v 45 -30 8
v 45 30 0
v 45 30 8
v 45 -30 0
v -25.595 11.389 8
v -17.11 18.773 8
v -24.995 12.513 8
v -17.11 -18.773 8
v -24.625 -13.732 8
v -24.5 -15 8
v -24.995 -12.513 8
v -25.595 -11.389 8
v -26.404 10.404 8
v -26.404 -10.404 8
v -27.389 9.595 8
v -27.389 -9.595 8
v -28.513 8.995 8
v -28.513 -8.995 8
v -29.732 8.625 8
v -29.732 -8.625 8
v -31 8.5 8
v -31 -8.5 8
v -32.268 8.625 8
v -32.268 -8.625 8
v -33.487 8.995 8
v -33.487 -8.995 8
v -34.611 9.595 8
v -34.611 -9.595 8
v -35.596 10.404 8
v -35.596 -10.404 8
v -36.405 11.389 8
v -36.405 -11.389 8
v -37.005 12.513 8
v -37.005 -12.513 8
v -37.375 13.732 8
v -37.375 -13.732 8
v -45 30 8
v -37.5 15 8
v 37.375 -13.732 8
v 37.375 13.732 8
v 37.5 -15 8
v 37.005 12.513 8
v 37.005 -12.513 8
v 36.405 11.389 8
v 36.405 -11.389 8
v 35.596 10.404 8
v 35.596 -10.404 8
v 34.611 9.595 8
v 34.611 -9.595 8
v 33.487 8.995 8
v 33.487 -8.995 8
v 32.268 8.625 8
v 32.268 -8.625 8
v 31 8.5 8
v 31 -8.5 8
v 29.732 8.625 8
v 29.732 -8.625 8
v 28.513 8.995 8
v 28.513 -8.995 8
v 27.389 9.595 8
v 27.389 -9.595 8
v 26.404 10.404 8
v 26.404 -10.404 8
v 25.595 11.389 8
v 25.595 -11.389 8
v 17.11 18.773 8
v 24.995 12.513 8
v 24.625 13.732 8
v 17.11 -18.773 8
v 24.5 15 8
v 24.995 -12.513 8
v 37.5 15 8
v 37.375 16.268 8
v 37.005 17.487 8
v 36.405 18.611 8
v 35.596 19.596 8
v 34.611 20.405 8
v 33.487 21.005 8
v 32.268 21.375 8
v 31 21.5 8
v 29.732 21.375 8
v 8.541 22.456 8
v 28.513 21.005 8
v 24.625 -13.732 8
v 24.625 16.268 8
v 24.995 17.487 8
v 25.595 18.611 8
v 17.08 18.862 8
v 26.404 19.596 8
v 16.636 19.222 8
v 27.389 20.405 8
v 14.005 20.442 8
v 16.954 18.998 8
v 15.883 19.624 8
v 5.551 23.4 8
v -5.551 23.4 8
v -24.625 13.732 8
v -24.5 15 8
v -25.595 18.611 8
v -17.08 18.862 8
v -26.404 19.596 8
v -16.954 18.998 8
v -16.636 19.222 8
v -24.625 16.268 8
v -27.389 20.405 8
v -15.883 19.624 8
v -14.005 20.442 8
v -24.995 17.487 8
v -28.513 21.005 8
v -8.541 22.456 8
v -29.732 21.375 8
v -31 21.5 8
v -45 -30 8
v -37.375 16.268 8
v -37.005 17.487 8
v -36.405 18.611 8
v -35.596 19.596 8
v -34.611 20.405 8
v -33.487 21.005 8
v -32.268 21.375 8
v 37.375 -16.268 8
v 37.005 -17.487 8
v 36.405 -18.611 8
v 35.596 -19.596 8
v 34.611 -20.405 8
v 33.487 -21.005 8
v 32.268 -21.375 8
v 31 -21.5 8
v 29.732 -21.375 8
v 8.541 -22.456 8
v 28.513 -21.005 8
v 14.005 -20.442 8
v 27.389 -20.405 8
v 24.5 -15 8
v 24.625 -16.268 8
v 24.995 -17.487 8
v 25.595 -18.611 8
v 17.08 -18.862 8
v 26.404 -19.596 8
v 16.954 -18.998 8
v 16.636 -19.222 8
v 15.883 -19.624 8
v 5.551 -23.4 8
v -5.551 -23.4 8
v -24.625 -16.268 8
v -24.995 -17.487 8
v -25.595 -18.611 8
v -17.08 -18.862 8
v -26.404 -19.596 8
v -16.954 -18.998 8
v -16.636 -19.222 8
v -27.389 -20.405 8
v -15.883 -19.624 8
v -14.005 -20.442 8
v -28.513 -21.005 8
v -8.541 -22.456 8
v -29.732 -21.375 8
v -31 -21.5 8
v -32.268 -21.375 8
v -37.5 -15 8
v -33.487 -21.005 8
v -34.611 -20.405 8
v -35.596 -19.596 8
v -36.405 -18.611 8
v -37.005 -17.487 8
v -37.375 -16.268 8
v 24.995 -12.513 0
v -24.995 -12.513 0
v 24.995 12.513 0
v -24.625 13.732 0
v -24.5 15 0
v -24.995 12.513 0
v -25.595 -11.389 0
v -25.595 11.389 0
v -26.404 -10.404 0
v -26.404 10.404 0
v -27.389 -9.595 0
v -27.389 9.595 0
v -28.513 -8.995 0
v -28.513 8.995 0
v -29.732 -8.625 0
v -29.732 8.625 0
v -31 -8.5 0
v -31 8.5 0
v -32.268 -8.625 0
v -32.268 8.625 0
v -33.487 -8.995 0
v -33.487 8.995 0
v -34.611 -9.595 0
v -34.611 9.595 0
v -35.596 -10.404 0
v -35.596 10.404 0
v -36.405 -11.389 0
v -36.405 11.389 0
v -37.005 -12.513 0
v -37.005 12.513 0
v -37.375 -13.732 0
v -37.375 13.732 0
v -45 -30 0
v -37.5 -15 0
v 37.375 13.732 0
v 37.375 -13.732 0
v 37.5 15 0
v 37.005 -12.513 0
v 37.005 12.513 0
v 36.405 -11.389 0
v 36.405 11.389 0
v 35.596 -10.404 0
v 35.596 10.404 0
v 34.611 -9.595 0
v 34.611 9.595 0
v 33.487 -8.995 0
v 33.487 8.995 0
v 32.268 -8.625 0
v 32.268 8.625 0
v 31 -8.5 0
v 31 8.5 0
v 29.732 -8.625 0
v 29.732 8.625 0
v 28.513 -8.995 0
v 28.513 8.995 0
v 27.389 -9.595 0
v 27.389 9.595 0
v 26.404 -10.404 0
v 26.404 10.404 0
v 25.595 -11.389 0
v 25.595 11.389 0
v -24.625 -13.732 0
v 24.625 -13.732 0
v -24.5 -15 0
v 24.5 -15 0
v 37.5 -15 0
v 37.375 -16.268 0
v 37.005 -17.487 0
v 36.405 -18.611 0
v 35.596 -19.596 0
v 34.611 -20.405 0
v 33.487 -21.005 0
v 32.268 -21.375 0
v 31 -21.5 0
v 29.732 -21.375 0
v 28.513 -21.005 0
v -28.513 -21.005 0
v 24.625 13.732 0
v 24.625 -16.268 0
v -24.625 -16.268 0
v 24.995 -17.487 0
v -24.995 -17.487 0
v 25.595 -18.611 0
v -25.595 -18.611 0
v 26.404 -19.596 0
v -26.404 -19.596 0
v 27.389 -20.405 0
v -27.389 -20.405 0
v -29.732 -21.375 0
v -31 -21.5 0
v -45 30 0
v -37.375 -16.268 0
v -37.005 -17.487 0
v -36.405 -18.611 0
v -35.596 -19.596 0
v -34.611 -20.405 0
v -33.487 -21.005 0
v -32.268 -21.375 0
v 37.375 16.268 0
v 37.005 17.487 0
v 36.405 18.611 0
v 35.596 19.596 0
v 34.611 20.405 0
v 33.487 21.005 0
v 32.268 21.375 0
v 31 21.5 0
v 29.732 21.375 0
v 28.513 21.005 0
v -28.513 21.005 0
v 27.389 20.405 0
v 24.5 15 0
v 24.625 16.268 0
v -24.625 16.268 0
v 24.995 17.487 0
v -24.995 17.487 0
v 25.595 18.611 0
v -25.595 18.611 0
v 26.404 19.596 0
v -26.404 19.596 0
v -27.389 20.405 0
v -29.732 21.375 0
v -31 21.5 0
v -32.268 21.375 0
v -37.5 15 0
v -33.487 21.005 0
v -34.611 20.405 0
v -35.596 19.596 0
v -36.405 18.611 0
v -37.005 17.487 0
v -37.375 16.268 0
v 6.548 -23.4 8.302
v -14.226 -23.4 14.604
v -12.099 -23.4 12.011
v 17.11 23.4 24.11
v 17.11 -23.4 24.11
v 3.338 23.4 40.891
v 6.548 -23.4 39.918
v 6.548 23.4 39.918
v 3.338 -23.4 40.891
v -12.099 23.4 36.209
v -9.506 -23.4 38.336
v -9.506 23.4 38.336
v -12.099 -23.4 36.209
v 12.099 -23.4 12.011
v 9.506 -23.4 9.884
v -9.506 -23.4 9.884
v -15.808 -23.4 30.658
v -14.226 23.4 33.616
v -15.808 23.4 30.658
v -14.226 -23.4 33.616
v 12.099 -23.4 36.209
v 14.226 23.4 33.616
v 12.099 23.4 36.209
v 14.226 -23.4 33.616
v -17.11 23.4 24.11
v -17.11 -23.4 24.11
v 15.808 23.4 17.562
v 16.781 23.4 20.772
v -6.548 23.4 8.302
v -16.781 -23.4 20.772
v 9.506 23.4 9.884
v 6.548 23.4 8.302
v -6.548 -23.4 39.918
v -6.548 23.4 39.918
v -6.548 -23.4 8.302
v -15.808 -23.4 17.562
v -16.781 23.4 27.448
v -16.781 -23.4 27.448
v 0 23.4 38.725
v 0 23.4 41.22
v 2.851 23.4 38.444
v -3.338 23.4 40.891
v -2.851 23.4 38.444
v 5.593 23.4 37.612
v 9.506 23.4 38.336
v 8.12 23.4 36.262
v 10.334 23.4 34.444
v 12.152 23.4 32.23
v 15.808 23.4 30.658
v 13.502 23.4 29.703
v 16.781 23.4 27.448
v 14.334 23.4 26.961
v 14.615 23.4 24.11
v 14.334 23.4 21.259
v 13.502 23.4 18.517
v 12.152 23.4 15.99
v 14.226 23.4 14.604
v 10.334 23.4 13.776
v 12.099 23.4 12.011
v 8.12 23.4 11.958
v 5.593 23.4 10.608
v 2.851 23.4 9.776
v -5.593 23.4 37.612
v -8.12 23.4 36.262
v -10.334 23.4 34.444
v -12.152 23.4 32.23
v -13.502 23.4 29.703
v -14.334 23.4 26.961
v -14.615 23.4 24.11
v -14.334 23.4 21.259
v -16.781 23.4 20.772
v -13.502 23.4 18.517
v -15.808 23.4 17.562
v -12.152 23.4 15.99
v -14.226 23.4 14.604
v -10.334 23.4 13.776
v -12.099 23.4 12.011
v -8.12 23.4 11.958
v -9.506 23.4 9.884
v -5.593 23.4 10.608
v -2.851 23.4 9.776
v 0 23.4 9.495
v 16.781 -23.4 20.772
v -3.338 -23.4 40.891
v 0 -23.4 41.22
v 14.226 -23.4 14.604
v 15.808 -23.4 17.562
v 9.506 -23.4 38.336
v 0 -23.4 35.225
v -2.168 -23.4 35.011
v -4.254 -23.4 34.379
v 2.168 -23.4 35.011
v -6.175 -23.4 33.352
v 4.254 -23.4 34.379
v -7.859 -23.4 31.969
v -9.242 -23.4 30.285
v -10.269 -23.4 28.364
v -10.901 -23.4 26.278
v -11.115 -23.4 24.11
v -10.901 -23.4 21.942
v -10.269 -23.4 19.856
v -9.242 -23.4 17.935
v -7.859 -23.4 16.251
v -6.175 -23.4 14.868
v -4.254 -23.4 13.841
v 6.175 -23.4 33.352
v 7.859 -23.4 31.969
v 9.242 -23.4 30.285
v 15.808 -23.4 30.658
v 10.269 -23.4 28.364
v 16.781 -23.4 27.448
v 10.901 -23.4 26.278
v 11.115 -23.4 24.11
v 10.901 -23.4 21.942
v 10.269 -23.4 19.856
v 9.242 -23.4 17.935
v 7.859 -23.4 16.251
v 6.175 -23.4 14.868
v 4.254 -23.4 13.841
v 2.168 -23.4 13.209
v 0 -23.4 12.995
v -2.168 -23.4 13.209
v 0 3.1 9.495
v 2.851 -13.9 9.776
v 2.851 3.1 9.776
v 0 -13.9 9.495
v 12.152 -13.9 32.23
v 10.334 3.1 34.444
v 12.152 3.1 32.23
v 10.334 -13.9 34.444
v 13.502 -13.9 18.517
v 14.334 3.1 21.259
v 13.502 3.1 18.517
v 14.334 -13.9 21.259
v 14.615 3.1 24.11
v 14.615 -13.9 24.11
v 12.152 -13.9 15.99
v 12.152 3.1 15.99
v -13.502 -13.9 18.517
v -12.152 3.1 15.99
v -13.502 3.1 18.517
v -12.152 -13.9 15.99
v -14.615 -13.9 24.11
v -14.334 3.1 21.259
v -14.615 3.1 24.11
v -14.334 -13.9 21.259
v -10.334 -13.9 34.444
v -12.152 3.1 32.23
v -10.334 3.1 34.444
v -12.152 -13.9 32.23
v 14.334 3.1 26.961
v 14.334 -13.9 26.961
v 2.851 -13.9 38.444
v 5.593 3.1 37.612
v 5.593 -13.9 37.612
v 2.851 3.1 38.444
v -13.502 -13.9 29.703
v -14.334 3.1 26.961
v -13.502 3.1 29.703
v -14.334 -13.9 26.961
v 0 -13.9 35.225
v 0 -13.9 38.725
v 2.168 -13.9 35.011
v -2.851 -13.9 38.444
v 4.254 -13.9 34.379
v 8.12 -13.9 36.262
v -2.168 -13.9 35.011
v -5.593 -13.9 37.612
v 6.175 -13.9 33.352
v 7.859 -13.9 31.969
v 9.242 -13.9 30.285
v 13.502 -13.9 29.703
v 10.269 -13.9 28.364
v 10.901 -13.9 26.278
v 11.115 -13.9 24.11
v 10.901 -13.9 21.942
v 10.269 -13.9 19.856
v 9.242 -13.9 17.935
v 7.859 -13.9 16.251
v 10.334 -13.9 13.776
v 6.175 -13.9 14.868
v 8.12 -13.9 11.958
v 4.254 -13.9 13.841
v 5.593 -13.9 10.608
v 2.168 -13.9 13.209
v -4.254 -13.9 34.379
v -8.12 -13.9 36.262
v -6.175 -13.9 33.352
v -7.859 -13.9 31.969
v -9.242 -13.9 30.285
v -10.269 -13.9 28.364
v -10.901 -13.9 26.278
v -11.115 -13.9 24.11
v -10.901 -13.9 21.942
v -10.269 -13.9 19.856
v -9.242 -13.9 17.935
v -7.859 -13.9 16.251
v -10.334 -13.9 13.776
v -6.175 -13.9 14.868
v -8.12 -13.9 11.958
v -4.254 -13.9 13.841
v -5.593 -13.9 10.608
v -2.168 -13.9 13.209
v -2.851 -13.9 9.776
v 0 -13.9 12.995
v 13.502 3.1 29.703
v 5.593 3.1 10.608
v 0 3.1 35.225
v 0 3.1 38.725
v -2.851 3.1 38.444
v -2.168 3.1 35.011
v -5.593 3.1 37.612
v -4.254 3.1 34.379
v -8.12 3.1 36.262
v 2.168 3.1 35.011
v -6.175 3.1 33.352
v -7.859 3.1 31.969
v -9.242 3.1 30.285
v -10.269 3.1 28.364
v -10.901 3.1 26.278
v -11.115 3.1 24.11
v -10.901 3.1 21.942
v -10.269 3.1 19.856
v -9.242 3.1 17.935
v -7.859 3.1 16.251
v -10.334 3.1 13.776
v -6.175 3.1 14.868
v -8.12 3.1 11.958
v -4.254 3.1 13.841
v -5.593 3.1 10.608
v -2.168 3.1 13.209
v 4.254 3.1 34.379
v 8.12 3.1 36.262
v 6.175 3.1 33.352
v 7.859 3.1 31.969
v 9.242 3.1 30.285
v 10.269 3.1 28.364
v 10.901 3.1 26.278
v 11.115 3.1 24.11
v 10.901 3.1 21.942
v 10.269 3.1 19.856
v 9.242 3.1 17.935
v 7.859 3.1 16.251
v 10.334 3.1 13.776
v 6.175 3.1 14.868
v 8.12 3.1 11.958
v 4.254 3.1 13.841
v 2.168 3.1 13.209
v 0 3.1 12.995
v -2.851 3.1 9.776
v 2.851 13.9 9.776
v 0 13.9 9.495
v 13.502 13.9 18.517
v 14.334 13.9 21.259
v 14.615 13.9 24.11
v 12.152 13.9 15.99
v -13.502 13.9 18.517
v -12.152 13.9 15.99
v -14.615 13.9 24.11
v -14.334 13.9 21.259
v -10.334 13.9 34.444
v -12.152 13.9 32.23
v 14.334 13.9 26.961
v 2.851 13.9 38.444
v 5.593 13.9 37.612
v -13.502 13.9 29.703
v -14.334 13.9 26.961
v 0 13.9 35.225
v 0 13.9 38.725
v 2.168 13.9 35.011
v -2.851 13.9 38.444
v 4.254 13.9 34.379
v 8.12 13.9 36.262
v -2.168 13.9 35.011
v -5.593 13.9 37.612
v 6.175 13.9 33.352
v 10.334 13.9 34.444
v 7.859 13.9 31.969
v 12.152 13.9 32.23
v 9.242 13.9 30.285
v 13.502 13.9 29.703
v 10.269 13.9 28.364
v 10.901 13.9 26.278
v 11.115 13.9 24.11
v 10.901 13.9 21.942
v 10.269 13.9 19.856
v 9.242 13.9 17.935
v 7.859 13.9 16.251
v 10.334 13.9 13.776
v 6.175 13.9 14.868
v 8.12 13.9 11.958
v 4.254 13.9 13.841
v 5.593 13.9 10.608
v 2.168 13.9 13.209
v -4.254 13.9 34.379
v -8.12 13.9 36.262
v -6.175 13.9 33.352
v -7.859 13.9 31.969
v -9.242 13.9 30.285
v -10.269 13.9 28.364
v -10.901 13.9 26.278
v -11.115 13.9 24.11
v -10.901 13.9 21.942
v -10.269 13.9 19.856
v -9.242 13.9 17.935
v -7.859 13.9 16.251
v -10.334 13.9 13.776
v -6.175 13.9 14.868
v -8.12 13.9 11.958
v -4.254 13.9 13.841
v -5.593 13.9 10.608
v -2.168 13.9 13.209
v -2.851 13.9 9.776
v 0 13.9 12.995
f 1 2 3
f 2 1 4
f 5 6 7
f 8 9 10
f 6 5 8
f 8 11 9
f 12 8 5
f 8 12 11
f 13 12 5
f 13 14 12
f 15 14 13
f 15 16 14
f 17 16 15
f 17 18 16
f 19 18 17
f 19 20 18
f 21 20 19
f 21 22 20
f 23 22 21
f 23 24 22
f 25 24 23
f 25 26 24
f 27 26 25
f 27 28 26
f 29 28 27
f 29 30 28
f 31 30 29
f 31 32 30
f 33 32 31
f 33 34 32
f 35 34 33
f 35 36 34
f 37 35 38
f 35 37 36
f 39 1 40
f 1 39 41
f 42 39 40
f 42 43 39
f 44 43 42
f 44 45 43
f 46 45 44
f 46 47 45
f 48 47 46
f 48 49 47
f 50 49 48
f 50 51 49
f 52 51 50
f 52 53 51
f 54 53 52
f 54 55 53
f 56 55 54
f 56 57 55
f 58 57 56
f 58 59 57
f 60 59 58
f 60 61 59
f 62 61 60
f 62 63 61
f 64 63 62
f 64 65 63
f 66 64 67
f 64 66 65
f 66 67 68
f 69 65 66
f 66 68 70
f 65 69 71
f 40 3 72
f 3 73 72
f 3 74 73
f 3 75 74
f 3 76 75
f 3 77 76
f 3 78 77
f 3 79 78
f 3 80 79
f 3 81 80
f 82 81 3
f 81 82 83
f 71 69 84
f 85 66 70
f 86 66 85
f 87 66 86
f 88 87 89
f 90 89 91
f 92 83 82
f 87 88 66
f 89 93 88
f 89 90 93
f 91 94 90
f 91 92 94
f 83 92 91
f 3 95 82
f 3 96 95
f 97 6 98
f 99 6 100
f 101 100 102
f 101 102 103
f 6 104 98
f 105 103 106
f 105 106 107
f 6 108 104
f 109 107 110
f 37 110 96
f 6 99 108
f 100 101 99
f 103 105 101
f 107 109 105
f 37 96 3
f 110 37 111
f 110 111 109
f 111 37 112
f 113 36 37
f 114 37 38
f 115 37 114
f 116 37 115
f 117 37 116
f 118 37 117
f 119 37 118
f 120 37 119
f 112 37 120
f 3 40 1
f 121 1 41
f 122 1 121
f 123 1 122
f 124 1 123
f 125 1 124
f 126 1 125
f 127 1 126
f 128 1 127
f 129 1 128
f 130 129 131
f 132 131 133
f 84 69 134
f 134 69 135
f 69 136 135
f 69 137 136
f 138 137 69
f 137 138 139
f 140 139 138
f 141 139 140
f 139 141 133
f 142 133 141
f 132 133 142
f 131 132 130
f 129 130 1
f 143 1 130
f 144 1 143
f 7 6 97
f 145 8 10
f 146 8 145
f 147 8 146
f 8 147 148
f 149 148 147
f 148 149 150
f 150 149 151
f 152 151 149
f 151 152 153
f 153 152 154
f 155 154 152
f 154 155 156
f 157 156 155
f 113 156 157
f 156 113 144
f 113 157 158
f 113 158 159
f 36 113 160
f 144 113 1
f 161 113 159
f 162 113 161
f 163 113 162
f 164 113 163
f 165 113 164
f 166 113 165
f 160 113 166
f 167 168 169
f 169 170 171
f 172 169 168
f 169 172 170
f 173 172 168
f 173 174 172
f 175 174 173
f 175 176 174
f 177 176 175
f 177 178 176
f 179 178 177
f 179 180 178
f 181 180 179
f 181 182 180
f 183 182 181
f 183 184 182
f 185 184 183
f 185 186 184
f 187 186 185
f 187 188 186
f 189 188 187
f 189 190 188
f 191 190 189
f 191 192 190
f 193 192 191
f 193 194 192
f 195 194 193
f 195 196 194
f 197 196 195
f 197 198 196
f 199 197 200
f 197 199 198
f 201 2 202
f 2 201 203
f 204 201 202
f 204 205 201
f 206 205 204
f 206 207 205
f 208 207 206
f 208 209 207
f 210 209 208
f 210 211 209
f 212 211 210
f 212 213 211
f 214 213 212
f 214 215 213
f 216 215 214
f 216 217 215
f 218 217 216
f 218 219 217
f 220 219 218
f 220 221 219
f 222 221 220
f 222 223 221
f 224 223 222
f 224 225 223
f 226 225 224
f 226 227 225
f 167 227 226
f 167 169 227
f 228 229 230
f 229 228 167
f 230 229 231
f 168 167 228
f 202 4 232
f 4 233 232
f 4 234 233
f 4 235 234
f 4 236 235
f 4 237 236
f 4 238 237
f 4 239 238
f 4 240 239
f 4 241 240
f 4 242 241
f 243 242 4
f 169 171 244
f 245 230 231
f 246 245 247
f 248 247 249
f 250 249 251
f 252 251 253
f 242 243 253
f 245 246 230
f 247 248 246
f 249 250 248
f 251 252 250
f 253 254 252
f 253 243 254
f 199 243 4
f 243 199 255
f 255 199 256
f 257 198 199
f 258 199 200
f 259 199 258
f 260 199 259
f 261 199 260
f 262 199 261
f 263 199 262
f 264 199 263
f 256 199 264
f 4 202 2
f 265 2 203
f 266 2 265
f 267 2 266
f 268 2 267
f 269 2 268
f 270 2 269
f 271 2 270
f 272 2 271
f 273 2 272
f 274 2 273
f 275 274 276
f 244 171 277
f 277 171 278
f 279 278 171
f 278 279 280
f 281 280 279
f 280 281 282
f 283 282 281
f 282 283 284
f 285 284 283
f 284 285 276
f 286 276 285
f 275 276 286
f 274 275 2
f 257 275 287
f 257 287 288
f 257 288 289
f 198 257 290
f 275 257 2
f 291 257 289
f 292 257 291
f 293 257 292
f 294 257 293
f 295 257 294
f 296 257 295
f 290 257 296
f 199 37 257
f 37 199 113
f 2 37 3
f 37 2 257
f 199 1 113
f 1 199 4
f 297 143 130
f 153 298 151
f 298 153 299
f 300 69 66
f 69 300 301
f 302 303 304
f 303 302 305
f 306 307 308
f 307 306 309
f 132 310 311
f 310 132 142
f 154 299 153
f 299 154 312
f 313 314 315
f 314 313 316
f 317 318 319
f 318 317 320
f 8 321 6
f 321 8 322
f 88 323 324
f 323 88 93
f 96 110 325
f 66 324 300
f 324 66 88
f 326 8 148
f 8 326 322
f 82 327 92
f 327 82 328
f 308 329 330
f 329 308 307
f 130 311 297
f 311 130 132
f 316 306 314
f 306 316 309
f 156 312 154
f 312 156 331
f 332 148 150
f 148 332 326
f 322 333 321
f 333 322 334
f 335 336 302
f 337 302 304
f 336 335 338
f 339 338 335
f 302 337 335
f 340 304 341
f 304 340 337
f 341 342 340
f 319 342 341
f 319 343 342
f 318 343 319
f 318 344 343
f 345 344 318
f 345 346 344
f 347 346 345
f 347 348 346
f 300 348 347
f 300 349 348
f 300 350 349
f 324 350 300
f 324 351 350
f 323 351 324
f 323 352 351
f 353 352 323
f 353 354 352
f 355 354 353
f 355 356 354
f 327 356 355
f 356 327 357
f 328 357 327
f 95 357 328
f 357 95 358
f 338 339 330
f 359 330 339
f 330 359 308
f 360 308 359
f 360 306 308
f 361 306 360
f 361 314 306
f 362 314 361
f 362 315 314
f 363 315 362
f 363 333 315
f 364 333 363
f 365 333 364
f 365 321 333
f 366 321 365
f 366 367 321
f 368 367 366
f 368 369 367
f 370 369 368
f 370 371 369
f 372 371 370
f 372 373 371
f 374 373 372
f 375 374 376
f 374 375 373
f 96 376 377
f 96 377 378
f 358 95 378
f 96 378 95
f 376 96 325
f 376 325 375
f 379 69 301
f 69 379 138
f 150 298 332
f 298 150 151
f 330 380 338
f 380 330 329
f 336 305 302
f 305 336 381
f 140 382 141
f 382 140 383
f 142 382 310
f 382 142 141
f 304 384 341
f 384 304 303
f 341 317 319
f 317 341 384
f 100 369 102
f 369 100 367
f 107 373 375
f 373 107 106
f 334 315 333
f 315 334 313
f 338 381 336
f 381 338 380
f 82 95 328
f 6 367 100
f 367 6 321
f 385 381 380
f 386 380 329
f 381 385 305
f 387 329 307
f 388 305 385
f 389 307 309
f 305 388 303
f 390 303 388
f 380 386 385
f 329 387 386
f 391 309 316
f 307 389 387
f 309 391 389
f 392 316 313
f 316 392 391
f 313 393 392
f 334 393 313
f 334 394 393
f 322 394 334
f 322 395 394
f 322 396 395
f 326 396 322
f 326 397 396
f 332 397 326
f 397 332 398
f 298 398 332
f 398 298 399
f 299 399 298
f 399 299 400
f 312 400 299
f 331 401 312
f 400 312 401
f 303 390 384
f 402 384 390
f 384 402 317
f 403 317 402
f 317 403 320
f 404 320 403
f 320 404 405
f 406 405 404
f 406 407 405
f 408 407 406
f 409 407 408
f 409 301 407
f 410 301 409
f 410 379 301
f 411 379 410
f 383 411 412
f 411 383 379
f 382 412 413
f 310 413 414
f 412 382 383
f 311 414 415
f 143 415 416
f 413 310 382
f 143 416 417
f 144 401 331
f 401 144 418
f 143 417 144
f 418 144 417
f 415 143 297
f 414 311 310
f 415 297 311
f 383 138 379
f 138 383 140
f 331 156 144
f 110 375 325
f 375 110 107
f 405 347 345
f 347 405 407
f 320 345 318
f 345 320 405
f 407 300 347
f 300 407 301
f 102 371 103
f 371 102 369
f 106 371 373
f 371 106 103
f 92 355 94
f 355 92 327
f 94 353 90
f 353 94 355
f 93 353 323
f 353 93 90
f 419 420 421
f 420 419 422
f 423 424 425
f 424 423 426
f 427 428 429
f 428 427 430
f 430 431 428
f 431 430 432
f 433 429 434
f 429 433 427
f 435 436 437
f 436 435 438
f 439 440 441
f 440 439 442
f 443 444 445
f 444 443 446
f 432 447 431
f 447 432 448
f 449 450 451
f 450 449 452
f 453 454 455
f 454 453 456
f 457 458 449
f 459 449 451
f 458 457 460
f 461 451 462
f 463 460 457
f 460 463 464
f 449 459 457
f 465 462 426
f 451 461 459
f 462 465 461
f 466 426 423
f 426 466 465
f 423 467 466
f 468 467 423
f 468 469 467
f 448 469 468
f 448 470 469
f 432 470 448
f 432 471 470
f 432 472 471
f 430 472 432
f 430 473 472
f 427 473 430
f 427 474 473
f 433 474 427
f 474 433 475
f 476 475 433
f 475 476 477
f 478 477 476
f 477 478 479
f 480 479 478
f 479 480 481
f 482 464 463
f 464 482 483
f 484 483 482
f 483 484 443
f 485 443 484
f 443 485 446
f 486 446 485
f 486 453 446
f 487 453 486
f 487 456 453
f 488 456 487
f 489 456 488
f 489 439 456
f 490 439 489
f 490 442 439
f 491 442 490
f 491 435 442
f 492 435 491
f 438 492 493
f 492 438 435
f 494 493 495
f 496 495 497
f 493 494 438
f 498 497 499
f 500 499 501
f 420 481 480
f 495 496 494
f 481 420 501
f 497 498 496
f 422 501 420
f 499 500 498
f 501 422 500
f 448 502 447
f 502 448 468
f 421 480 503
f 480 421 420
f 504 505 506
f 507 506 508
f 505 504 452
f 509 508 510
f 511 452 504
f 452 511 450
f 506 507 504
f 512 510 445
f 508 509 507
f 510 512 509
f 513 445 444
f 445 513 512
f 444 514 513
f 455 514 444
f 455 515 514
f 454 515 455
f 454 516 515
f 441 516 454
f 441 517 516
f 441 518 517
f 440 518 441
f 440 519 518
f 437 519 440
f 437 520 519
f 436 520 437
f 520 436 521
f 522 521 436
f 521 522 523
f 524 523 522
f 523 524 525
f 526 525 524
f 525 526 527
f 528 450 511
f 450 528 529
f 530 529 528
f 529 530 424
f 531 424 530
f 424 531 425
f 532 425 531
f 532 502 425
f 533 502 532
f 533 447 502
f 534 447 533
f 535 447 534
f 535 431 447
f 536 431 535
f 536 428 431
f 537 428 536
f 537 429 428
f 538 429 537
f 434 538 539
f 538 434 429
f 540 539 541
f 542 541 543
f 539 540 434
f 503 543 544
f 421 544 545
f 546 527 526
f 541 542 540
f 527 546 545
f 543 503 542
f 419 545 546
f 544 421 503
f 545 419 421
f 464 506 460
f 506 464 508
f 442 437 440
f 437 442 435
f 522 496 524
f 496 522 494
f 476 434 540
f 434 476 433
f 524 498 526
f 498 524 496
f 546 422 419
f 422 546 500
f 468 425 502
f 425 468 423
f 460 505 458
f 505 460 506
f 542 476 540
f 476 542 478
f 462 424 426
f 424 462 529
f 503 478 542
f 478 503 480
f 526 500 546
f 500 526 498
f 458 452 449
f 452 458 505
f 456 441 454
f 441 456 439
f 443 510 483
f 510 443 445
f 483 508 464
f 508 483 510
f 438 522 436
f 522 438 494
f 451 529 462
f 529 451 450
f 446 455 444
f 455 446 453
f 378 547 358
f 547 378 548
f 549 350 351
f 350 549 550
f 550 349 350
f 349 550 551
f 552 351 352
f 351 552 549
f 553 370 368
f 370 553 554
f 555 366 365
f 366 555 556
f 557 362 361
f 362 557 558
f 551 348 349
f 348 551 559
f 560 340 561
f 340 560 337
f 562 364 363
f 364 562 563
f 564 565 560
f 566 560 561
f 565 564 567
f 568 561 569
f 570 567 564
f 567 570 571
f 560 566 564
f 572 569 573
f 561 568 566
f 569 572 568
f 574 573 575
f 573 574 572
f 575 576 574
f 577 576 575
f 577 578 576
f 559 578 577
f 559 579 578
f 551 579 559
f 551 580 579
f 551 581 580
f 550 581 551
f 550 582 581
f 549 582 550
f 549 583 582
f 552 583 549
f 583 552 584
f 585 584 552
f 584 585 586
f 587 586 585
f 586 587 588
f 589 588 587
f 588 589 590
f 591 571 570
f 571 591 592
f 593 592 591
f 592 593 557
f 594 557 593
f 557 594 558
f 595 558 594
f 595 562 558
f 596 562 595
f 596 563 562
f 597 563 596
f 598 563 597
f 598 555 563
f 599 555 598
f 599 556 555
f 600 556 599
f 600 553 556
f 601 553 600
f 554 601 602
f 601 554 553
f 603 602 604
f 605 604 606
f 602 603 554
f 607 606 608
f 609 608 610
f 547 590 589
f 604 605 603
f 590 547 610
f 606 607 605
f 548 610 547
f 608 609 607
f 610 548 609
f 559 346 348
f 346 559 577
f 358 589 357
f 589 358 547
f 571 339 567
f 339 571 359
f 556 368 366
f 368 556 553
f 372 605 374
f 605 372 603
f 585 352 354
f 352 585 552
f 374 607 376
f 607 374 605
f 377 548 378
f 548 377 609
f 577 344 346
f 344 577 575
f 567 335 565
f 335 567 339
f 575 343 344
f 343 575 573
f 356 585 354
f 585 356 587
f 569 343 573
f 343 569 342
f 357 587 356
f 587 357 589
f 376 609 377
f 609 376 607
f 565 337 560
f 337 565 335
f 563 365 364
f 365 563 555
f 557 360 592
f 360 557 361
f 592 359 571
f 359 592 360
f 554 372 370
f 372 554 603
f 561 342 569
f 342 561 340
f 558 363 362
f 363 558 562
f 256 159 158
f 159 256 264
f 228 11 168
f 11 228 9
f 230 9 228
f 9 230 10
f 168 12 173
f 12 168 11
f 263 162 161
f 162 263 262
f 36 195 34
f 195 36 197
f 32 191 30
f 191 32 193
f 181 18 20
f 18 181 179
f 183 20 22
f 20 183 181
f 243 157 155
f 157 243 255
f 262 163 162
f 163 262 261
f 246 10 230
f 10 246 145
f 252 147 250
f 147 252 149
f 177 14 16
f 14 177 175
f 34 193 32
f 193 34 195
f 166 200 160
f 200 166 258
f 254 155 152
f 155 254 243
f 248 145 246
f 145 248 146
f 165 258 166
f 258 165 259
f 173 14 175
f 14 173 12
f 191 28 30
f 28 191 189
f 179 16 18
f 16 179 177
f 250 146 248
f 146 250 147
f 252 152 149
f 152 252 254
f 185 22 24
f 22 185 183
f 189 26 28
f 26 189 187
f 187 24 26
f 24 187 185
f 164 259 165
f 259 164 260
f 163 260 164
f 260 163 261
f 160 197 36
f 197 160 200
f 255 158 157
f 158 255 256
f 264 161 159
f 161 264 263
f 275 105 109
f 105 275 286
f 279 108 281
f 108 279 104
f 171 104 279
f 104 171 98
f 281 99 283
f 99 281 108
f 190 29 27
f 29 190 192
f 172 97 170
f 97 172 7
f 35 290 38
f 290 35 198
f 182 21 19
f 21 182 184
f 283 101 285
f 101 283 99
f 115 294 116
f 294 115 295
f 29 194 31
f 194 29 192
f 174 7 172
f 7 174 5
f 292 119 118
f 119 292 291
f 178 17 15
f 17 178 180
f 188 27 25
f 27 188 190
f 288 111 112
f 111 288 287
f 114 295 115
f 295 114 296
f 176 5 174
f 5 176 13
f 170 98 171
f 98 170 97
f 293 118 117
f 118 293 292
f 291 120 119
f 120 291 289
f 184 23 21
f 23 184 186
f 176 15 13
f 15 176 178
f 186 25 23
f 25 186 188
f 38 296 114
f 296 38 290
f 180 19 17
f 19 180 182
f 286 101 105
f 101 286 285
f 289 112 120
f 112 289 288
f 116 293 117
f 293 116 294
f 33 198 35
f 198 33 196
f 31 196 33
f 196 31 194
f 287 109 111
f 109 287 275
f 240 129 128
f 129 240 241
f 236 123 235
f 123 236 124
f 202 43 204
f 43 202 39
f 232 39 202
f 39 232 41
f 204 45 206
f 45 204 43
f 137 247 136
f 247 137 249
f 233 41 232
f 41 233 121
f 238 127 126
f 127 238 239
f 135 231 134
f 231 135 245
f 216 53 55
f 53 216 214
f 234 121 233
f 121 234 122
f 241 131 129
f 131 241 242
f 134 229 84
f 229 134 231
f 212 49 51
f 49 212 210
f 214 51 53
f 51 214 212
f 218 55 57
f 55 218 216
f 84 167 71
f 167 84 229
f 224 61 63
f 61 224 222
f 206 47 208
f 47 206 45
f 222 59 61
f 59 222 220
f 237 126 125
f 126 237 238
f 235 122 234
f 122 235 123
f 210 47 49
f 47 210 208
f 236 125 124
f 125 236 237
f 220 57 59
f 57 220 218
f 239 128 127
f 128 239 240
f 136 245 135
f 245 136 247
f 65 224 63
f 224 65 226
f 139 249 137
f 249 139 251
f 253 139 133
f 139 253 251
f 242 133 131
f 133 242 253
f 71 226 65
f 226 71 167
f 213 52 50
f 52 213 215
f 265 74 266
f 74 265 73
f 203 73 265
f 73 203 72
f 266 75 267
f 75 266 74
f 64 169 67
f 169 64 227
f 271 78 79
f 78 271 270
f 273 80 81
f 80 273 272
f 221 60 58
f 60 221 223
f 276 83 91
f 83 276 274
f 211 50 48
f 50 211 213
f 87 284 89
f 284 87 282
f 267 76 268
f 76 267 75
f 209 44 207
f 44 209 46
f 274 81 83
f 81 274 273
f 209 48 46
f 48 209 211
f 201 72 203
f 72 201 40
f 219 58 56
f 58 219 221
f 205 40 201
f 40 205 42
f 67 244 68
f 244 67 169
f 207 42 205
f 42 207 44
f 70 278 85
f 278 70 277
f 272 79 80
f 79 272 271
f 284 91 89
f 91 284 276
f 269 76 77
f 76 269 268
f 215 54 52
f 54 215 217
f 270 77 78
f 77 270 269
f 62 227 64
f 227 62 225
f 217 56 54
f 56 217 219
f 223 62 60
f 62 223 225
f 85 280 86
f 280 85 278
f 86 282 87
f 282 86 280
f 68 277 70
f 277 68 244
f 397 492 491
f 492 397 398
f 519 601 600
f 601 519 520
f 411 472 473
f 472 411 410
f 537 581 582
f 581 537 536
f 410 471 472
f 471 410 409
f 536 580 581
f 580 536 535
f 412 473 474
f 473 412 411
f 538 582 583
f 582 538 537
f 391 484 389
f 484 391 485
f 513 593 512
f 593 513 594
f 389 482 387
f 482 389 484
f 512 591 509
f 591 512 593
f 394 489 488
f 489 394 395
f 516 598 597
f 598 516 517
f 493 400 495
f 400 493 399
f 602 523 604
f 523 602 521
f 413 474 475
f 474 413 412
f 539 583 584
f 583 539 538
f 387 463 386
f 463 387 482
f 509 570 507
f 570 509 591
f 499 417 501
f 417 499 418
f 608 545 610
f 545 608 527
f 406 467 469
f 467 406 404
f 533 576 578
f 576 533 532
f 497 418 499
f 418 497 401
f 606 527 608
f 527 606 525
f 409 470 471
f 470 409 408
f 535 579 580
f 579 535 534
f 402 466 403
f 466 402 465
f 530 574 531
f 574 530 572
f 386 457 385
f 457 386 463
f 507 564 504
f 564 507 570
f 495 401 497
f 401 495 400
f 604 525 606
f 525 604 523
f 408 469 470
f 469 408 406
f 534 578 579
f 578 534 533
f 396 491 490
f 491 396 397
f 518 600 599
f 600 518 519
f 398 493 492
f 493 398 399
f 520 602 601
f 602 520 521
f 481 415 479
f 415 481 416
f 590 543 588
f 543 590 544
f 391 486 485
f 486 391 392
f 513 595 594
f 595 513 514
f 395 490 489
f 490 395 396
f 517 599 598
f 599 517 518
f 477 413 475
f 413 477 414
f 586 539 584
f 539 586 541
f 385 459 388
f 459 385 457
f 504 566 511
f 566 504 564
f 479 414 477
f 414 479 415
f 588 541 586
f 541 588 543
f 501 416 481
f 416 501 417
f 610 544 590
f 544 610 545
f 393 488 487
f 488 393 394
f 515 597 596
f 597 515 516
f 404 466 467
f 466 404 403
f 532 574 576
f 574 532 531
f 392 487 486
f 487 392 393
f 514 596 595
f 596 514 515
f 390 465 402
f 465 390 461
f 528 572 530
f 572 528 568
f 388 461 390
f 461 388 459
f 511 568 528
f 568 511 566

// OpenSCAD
$fn = 32;

// ----------------------------------------------------------------------
// Bearing block: 90 x 60 mm base, 22.23 mm bore at 24.11 mm
// ----------------------------------------------------------------------

// --- parameters (mm) ---
base_w = 90;              // base width
base_d = 60;              // base depth
base_t = 8;               // base thickness
bore_d = 22.23;           // shaft / bearing bore
house_r = 17.11;          // housing outer radius
house_len = 46.8;         // housing length along the shaft
foot_w = 34.22;           // foot width under the housing
foot_len = 36.8;          // foot length along the shaft
axis_z = 24.11;           // bore axis height above the base
holes_d = 13;             // mounting holes
hole_x = 31;              // mounting hole spacing
seat_d = 12;              // bearing seat depth
seat_wall = 3.5;          // seat wall thickness

difference() {
  union() {
    /* base plate with its underside on z = 0 */
    translate([0, 0, base_t / 2]) cube([base_w, base_d, base_t], center = true);
    /* hull foot: a straight web blending into the round housing */
    hull() {
      translate([0, 0, base_t - 0.5]) cube([foot_w, foot_len, 1.6], center = true);
      translate([0, 0, axis_z]) rotate([-90, 0, 0]) cylinder(h = house_len, d = 2 * house_r, center = true);
    }
  }
  /* bore through the housing, 2.5 mm clear on both sides */
  translate([0, 0, axis_z]) rotate([-90, 0, 0]) cylinder(h = house_len + 5, d = bore_d, center = true);
  /* bearing seats, recessed into both ends of the housing */
  for (sy = [-1, 1]) {
    translate([0, sy * (house_len / 2 - seat_d + 2.5), axis_z]) rotate([-90, 0, 0]) cylinder(h = seat_d + 5, d = bore_d + 2 * seat_wall);
  }
  /* mounting holes through the base plate */
  for (hx = [-31, 31]) {
    for (hy = [-15, 15]) {
      translate([hx, hy, -2.5]) cylinder(h = base_t + 5, d = holes_d);
    }
  }
}
